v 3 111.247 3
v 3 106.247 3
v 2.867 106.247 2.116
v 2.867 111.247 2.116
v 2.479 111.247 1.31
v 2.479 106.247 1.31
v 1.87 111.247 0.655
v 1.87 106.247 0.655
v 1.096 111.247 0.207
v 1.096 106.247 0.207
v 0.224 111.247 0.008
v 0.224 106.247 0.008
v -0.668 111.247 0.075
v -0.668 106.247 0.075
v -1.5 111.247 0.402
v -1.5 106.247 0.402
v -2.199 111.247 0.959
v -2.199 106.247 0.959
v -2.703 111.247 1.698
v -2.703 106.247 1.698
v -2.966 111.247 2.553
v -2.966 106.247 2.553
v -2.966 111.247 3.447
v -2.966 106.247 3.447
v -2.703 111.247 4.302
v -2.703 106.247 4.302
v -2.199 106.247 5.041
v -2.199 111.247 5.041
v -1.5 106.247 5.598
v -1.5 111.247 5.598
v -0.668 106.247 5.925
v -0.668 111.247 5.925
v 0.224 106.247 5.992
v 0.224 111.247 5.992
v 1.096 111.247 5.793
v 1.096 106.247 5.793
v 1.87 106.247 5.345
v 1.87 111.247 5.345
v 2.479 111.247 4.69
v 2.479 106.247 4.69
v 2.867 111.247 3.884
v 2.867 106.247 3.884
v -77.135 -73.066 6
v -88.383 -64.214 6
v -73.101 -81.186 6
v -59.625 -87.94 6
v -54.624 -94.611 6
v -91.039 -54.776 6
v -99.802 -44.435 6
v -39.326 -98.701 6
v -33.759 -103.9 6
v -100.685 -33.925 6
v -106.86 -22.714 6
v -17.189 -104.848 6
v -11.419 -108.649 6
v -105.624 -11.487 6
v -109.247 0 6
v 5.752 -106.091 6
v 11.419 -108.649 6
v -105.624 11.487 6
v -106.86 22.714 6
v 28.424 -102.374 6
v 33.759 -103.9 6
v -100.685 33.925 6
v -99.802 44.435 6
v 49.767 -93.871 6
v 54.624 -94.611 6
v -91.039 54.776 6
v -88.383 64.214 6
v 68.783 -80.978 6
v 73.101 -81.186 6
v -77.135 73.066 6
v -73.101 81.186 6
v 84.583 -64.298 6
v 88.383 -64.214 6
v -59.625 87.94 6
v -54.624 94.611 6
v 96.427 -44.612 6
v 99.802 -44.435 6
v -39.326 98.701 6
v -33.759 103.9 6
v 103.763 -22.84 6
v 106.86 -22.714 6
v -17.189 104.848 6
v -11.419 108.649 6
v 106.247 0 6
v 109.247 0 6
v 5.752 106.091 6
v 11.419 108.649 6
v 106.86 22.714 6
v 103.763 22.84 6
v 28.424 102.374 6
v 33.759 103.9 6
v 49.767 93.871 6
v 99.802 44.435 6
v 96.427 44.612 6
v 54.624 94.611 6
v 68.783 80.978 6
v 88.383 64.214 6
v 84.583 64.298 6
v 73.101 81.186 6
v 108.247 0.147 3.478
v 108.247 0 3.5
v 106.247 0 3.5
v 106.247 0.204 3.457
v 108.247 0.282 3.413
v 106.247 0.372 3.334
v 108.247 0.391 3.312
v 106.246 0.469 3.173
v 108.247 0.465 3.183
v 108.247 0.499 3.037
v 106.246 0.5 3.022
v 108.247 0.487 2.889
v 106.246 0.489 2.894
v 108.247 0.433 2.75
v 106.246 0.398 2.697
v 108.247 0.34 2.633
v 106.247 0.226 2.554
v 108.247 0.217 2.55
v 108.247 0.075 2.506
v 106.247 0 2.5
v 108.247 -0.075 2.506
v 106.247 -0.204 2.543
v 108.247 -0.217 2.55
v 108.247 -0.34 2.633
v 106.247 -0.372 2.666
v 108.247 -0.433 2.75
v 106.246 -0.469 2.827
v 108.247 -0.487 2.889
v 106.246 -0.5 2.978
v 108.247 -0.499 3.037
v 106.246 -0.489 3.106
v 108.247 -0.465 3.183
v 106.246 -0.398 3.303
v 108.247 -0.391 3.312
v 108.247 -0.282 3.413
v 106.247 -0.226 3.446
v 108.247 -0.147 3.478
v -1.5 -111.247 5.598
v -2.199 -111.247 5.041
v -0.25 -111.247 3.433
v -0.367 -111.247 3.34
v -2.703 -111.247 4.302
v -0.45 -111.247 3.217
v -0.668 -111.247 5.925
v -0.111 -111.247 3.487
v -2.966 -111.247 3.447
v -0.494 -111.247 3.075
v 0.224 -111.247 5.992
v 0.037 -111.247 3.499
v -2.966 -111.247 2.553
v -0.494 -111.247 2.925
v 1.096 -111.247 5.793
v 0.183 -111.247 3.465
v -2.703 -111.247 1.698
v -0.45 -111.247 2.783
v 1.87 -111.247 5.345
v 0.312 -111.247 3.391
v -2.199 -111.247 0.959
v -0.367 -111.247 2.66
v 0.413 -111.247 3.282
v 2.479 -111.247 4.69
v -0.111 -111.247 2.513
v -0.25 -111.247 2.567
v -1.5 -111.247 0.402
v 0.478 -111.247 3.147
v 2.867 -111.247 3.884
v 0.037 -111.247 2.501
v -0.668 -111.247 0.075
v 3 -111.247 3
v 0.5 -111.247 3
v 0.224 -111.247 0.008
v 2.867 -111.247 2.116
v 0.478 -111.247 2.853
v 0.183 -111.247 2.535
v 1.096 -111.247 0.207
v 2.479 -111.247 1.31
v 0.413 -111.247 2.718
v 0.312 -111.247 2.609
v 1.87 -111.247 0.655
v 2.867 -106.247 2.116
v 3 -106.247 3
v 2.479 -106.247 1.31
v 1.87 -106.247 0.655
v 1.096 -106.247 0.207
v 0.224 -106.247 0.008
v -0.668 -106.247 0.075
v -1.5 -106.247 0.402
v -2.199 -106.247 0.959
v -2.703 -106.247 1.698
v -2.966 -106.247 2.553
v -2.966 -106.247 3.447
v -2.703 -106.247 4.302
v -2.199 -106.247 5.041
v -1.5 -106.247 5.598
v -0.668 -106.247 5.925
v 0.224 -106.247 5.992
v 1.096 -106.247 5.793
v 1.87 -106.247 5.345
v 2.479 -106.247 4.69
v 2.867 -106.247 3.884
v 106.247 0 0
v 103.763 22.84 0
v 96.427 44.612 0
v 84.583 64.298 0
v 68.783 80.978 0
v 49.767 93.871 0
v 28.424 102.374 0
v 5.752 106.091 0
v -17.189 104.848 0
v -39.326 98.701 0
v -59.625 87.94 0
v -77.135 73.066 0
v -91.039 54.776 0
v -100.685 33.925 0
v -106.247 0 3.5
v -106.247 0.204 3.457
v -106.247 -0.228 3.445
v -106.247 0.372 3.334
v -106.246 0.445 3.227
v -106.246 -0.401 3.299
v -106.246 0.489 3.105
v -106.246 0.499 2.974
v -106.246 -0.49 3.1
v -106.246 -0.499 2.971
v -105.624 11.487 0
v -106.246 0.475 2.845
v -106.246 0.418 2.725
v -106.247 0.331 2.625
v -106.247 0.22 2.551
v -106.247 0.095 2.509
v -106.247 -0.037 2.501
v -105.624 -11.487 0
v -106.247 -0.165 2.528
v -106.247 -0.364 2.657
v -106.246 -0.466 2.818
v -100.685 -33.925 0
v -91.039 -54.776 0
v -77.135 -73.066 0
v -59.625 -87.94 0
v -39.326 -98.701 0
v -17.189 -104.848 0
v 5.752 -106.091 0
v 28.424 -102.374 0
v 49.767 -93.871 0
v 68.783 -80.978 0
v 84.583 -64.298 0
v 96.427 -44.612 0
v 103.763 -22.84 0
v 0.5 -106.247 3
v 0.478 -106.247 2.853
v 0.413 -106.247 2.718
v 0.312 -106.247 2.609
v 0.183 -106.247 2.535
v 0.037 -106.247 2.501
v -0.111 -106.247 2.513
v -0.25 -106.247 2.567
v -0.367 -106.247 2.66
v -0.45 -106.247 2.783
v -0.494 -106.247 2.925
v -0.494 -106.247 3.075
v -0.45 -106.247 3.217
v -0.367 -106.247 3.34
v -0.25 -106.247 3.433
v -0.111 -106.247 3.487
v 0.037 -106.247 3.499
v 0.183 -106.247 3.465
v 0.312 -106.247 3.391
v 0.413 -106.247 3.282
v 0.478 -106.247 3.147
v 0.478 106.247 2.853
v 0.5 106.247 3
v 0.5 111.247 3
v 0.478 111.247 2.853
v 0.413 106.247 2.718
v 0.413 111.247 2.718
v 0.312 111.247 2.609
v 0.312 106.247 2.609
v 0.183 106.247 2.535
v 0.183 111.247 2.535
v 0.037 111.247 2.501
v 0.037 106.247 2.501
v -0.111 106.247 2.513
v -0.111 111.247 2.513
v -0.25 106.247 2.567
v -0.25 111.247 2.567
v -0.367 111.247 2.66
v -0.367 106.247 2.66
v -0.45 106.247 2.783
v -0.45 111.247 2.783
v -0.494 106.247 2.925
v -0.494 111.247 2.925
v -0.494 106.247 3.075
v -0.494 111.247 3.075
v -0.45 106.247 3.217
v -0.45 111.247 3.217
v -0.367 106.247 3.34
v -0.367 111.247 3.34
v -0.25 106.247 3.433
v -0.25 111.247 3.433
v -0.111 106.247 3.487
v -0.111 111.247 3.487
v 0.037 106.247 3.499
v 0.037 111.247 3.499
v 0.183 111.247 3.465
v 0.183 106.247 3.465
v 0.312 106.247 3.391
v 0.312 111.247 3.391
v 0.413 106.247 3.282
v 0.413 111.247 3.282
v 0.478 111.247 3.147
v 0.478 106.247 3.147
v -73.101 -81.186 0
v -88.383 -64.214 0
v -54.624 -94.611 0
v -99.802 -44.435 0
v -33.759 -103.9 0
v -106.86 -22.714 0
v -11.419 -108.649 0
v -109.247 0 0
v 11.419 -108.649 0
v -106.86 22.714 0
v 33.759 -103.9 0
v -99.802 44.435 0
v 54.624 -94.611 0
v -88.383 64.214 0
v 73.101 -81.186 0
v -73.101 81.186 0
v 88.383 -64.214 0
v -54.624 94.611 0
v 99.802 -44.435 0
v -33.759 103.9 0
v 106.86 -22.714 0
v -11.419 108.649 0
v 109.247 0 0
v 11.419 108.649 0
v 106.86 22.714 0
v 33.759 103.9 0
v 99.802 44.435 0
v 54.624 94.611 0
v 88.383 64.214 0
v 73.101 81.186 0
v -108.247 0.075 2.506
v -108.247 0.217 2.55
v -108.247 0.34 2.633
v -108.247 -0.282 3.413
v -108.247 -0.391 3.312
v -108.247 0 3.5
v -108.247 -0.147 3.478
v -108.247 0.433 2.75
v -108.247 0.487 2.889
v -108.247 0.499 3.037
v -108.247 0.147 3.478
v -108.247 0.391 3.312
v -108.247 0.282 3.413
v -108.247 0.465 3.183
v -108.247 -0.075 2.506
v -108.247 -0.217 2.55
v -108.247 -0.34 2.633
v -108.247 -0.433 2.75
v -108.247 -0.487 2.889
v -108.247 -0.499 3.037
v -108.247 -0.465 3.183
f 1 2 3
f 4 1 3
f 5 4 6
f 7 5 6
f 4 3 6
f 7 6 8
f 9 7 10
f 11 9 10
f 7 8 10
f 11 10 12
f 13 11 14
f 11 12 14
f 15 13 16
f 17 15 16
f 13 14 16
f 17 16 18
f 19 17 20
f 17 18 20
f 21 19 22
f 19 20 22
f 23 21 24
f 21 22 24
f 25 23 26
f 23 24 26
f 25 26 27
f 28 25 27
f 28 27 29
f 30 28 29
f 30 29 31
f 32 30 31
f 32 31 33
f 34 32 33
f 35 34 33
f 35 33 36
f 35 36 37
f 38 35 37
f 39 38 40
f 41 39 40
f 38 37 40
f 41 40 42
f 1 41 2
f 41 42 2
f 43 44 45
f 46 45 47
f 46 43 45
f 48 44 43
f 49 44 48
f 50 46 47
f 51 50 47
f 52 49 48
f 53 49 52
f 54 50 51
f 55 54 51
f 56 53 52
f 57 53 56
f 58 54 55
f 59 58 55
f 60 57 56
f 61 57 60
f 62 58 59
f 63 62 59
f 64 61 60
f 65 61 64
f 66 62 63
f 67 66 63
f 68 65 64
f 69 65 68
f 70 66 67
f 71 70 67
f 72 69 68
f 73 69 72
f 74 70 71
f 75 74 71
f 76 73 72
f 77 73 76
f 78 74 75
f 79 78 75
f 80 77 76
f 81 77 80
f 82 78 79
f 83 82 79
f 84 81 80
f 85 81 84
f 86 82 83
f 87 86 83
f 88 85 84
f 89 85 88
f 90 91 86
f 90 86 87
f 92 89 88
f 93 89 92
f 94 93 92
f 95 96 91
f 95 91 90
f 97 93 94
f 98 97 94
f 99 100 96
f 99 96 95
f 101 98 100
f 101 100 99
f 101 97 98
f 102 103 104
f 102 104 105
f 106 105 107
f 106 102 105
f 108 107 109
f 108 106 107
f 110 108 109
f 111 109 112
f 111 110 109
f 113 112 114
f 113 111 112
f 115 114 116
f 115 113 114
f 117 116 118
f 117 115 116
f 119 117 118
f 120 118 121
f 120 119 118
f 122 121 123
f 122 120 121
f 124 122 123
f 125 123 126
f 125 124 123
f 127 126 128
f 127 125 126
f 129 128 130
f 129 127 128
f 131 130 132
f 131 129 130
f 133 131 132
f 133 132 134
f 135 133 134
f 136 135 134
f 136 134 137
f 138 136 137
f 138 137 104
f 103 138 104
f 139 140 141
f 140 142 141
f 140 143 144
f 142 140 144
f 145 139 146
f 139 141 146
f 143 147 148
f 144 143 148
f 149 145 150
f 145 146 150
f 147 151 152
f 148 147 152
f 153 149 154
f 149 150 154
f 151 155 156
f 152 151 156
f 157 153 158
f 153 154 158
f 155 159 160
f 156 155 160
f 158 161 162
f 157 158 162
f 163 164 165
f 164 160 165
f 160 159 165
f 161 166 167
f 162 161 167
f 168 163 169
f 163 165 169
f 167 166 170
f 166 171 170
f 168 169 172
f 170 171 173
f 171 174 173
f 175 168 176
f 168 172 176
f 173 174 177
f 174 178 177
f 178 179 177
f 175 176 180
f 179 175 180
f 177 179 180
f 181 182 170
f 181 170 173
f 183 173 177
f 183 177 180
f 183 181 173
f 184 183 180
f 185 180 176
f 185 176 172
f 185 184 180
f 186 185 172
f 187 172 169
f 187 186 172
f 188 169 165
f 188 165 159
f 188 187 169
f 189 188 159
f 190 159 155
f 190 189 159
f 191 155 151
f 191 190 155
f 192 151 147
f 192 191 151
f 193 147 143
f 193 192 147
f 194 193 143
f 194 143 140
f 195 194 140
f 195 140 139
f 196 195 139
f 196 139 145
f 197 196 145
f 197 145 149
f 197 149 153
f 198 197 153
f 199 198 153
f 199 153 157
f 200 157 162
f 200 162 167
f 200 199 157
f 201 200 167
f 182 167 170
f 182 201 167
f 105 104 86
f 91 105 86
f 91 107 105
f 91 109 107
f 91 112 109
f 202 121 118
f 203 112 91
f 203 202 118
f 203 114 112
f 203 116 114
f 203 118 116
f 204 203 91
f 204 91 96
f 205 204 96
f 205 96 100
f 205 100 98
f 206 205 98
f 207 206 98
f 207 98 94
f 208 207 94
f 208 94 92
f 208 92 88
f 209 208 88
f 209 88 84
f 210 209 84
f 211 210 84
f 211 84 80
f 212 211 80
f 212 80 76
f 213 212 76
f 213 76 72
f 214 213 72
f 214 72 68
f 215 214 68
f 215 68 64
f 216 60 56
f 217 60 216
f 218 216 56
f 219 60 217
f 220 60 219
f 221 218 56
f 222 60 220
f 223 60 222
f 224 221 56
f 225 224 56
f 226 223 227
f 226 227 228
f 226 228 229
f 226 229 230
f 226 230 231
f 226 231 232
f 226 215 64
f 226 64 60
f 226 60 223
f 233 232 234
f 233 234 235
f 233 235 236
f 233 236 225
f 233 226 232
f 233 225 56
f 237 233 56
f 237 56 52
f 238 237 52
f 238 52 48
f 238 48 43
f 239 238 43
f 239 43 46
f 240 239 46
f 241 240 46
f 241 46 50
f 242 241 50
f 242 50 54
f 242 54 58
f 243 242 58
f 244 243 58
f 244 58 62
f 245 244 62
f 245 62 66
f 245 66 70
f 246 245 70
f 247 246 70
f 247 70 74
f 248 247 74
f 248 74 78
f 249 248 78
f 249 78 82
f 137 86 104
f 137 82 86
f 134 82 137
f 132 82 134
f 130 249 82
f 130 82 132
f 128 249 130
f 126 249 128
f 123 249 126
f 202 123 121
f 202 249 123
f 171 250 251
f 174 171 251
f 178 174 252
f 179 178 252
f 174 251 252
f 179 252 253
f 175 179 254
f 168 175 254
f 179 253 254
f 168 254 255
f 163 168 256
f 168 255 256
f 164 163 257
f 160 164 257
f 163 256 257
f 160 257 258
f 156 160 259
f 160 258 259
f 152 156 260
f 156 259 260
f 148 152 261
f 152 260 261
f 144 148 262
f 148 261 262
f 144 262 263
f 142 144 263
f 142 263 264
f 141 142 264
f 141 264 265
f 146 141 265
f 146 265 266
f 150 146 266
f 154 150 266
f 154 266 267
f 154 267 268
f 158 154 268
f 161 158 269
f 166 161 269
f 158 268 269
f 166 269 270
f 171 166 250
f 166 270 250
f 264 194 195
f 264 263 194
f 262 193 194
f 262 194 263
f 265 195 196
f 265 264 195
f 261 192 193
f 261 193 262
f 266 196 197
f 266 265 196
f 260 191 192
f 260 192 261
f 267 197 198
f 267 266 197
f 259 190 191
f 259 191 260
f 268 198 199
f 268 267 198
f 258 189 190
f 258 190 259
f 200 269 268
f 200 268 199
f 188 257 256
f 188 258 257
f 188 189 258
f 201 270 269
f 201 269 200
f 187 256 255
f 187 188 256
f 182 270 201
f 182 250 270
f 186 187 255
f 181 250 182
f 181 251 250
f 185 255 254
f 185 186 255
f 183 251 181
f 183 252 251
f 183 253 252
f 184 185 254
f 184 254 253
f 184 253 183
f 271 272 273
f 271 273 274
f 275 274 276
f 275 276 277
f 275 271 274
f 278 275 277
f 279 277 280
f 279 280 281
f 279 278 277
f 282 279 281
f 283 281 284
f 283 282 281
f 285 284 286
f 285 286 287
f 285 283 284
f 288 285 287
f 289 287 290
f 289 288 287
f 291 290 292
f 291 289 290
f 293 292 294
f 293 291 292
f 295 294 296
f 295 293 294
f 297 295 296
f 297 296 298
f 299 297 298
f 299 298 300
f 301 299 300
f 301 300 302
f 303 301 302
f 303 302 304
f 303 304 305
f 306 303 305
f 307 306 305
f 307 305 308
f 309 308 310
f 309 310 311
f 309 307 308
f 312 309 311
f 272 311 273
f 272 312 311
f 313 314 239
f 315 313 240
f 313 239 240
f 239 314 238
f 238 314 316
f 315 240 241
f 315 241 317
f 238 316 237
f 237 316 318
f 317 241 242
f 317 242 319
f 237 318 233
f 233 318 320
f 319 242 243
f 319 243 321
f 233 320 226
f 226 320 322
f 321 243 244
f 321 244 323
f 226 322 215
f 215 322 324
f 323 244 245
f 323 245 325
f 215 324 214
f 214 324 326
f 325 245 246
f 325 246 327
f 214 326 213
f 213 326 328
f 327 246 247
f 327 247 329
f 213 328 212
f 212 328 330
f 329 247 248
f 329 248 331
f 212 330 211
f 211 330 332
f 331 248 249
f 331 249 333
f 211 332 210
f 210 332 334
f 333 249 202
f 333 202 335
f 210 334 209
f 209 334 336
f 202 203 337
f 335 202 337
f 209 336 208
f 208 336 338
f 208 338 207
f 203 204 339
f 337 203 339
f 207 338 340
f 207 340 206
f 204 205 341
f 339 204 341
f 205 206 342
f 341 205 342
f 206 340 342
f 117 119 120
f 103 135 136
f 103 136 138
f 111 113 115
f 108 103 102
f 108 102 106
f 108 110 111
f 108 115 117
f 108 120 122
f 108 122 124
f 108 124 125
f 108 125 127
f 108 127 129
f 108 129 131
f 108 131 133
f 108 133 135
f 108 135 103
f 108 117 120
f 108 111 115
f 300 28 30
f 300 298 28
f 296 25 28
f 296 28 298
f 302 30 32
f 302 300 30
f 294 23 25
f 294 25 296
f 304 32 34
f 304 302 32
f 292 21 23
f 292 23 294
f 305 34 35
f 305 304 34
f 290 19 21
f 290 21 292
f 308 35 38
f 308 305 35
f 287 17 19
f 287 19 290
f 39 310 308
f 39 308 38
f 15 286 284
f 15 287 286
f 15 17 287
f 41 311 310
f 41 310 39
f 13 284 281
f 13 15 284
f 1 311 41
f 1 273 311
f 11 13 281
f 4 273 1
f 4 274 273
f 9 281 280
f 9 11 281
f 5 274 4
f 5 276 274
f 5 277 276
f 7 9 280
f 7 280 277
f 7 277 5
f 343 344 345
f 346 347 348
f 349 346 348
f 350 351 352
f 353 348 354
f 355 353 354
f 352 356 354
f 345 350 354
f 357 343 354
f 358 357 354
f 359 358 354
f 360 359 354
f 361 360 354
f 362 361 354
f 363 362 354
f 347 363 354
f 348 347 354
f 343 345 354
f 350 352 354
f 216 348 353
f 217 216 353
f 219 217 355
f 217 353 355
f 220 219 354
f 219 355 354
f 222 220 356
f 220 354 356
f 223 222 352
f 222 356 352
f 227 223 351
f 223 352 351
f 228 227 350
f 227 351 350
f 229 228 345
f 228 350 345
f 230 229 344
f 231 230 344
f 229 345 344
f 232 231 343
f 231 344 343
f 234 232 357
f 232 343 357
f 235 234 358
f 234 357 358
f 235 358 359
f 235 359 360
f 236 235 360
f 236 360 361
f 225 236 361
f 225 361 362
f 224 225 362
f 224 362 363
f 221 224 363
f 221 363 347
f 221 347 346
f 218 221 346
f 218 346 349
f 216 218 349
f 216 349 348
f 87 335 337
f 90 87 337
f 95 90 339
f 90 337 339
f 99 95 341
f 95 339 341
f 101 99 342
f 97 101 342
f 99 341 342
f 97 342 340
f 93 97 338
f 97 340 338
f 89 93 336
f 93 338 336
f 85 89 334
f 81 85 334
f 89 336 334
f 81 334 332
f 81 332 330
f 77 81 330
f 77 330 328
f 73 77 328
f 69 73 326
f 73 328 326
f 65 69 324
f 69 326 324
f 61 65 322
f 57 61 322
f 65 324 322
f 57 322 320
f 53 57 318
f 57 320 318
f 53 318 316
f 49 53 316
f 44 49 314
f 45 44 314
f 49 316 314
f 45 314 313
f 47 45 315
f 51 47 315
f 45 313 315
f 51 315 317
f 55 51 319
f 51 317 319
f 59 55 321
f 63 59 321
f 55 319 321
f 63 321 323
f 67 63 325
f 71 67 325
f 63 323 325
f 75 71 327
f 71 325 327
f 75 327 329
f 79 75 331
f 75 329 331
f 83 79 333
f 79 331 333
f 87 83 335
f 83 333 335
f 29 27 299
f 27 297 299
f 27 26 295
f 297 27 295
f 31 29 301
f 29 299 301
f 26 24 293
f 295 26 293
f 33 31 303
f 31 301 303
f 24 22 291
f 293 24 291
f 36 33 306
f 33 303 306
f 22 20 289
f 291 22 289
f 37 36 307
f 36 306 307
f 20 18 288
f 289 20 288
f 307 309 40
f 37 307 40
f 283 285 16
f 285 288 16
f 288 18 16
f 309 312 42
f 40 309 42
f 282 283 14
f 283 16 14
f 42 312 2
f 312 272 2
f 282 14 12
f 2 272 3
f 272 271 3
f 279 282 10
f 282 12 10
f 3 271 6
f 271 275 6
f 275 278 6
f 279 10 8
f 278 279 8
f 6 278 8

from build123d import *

# Parameters (mm, degrees)
SKETCH1_R           = 109.24716621
SKETCH1_R_2         = 106.24716621
BOSS_EXTRUDE1_DEPTH = 6
SKETCH3_R           = 3
SKETCH3_R_2         = 0.5
BOSS_EXTRUDE2_DEPTH = 5
SKETCH4_R           = 3
SKETCH4_R_2         = 0.5
BOSS_EXTRUDE3_DEPTH = 5
SKETCH8_R           = 0.5
CUT_EXTRUDE7_DEPTH  = 3
SKETCH9_R           = 0.5
CUT_EXTRUDE8_DEPTH  = 3


with BuildPart() as part:
    # Sketch1 → Boss-Extrude1 (new body)
    with BuildSketch(Plane.XY):
        Circle(SKETCH1_R)
        Circle(SKETCH1_R_2, mode=Mode.SUBTRACT)
    extrude(amount=BOSS_EXTRUDE1_DEPTH)

    # Sketch8 → Cut-Extrude7 (cut)
    with BuildSketch(Plane.ZY.offset(-108.24716621)):
        with Locations((3, 0)):
            Circle(SKETCH8_R)
    extrude(amount=CUT_EXTRUDE7_DEPTH, mode=Mode.SUBTRACT)

    # Sketch9 → Cut-Extrude8 (cut)
    with BuildSketch(Plane.ZY.offset(108.24716621)):
        with Locations((3, 0)):
            Circle(SKETCH9_R)
    extrude(amount=-CUT_EXTRUDE8_DEPTH, mode=Mode.SUBTRACT)


with BuildPart() as body_2:
    # Sketch3 → Boss-Extrude2 (new body)
    with BuildSketch(Plane(origin=(0, -106.24716621, 0), x_dir=(1, 0, 0), z_dir=(0, 1, 0))):
        with Locations((0, -3)):
            Circle(SKETCH3_R)
        with Locations((0, -3)):
            Circle(SKETCH3_R_2, mode=Mode.SUBTRACT)
    extrude(amount=-BOSS_EXTRUDE2_DEPTH)


with BuildPart() as body_3:
    # Sketch4 → Boss-Extrude3 (new body)
    with BuildSketch(Plane(origin=(0, 106.24716621, 0), x_dir=(1, 0, 0), z_dir=(0, 1, 0))):
        with Locations((0, -3)):
            Circle(SKETCH4_R)
        with Locations((0, -3)):
            Circle(SKETCH4_R_2, mode=Mode.SUBTRACT)
    extrude(amount=BOSS_EXTRUDE3_DEPTH)


solid = Compound([part.part, body_2.part, body_3.part])
